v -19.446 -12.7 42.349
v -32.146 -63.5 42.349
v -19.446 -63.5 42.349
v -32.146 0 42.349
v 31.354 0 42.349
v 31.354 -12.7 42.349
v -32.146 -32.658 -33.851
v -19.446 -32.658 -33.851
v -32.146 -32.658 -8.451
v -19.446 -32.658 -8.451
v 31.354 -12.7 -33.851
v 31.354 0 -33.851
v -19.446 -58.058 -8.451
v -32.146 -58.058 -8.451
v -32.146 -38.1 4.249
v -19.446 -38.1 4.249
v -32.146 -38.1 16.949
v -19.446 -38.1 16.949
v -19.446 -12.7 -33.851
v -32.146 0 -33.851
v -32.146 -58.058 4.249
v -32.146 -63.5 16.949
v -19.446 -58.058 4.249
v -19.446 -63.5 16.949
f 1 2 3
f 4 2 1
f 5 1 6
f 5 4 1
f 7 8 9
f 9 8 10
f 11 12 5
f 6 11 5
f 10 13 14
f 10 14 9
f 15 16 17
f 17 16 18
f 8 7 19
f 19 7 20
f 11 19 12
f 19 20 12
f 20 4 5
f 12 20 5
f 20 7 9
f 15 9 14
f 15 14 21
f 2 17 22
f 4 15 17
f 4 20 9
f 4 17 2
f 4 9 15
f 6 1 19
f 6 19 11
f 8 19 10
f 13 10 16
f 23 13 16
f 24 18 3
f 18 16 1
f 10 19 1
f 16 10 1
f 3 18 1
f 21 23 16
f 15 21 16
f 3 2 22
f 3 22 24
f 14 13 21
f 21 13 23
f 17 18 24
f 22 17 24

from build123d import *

# Parameters (mm, degrees)
F0_W     = 63.5
F0_H     = 76.2
F1_DEPTH = 12.7
F2_W     = 12.7
F2_H     = 76.2
F3_DEPTH = 50.8
F4_W     = 5.442066
F4_H     = 25.4
F4_H_2   = 12.7
F5_DEPTH = 12.7
F6_W     = 25.4
F6_H     = 25.4
F7_DEPTH = 12.7


with BuildPart() as f1:
    # F0 (on Front) → F1 (new body)
    with BuildSketch(Plane.XZ):
        with Locations((-0.396088, 4.24908)):
            Rectangle(F0_W, F0_H)
    extrude(amount=F1_DEPTH)

    # F2 (on face) → F3 (join)
    with BuildSketch(Plane.XZ.offset(12.7)):
        with Locations((-25.796088, 4.24908)):
            Rectangle(F2_W, F2_H)
    extrude(amount=F3_DEPTH)

    # F4 (on face) → F5 (cut)
    with BuildSketch(Plane.YZ.offset(-19.446088)):
        Polygon((-38.1, 16.94908), (-63.5, 16.94908), (-63.5, 4.24908), (-58.057934, 4.24908), (-38.1, 4.24908), align=None)
        with Locations((-60.778967, -8.45092)):
            Rectangle(F4_W, F4_H)
        with Locations((-60.778967, -27.50092)):
            Rectangle(F4_W, F4_H_2)
    extrude(amount=-F5_DEPTH, mode=Mode.SUBTRACT)

    # F6 (on face) → F7 (cut)
    with BuildSketch(Plane.YZ.offset(-19.446088)):
        with Locations((-45.357934, -21.15092)):
            Rectangle(F6_W, F6_H)
    extrude(amount=-F7_DEPTH, mode=Mode.SUBTRACT)


solid = f1.part
